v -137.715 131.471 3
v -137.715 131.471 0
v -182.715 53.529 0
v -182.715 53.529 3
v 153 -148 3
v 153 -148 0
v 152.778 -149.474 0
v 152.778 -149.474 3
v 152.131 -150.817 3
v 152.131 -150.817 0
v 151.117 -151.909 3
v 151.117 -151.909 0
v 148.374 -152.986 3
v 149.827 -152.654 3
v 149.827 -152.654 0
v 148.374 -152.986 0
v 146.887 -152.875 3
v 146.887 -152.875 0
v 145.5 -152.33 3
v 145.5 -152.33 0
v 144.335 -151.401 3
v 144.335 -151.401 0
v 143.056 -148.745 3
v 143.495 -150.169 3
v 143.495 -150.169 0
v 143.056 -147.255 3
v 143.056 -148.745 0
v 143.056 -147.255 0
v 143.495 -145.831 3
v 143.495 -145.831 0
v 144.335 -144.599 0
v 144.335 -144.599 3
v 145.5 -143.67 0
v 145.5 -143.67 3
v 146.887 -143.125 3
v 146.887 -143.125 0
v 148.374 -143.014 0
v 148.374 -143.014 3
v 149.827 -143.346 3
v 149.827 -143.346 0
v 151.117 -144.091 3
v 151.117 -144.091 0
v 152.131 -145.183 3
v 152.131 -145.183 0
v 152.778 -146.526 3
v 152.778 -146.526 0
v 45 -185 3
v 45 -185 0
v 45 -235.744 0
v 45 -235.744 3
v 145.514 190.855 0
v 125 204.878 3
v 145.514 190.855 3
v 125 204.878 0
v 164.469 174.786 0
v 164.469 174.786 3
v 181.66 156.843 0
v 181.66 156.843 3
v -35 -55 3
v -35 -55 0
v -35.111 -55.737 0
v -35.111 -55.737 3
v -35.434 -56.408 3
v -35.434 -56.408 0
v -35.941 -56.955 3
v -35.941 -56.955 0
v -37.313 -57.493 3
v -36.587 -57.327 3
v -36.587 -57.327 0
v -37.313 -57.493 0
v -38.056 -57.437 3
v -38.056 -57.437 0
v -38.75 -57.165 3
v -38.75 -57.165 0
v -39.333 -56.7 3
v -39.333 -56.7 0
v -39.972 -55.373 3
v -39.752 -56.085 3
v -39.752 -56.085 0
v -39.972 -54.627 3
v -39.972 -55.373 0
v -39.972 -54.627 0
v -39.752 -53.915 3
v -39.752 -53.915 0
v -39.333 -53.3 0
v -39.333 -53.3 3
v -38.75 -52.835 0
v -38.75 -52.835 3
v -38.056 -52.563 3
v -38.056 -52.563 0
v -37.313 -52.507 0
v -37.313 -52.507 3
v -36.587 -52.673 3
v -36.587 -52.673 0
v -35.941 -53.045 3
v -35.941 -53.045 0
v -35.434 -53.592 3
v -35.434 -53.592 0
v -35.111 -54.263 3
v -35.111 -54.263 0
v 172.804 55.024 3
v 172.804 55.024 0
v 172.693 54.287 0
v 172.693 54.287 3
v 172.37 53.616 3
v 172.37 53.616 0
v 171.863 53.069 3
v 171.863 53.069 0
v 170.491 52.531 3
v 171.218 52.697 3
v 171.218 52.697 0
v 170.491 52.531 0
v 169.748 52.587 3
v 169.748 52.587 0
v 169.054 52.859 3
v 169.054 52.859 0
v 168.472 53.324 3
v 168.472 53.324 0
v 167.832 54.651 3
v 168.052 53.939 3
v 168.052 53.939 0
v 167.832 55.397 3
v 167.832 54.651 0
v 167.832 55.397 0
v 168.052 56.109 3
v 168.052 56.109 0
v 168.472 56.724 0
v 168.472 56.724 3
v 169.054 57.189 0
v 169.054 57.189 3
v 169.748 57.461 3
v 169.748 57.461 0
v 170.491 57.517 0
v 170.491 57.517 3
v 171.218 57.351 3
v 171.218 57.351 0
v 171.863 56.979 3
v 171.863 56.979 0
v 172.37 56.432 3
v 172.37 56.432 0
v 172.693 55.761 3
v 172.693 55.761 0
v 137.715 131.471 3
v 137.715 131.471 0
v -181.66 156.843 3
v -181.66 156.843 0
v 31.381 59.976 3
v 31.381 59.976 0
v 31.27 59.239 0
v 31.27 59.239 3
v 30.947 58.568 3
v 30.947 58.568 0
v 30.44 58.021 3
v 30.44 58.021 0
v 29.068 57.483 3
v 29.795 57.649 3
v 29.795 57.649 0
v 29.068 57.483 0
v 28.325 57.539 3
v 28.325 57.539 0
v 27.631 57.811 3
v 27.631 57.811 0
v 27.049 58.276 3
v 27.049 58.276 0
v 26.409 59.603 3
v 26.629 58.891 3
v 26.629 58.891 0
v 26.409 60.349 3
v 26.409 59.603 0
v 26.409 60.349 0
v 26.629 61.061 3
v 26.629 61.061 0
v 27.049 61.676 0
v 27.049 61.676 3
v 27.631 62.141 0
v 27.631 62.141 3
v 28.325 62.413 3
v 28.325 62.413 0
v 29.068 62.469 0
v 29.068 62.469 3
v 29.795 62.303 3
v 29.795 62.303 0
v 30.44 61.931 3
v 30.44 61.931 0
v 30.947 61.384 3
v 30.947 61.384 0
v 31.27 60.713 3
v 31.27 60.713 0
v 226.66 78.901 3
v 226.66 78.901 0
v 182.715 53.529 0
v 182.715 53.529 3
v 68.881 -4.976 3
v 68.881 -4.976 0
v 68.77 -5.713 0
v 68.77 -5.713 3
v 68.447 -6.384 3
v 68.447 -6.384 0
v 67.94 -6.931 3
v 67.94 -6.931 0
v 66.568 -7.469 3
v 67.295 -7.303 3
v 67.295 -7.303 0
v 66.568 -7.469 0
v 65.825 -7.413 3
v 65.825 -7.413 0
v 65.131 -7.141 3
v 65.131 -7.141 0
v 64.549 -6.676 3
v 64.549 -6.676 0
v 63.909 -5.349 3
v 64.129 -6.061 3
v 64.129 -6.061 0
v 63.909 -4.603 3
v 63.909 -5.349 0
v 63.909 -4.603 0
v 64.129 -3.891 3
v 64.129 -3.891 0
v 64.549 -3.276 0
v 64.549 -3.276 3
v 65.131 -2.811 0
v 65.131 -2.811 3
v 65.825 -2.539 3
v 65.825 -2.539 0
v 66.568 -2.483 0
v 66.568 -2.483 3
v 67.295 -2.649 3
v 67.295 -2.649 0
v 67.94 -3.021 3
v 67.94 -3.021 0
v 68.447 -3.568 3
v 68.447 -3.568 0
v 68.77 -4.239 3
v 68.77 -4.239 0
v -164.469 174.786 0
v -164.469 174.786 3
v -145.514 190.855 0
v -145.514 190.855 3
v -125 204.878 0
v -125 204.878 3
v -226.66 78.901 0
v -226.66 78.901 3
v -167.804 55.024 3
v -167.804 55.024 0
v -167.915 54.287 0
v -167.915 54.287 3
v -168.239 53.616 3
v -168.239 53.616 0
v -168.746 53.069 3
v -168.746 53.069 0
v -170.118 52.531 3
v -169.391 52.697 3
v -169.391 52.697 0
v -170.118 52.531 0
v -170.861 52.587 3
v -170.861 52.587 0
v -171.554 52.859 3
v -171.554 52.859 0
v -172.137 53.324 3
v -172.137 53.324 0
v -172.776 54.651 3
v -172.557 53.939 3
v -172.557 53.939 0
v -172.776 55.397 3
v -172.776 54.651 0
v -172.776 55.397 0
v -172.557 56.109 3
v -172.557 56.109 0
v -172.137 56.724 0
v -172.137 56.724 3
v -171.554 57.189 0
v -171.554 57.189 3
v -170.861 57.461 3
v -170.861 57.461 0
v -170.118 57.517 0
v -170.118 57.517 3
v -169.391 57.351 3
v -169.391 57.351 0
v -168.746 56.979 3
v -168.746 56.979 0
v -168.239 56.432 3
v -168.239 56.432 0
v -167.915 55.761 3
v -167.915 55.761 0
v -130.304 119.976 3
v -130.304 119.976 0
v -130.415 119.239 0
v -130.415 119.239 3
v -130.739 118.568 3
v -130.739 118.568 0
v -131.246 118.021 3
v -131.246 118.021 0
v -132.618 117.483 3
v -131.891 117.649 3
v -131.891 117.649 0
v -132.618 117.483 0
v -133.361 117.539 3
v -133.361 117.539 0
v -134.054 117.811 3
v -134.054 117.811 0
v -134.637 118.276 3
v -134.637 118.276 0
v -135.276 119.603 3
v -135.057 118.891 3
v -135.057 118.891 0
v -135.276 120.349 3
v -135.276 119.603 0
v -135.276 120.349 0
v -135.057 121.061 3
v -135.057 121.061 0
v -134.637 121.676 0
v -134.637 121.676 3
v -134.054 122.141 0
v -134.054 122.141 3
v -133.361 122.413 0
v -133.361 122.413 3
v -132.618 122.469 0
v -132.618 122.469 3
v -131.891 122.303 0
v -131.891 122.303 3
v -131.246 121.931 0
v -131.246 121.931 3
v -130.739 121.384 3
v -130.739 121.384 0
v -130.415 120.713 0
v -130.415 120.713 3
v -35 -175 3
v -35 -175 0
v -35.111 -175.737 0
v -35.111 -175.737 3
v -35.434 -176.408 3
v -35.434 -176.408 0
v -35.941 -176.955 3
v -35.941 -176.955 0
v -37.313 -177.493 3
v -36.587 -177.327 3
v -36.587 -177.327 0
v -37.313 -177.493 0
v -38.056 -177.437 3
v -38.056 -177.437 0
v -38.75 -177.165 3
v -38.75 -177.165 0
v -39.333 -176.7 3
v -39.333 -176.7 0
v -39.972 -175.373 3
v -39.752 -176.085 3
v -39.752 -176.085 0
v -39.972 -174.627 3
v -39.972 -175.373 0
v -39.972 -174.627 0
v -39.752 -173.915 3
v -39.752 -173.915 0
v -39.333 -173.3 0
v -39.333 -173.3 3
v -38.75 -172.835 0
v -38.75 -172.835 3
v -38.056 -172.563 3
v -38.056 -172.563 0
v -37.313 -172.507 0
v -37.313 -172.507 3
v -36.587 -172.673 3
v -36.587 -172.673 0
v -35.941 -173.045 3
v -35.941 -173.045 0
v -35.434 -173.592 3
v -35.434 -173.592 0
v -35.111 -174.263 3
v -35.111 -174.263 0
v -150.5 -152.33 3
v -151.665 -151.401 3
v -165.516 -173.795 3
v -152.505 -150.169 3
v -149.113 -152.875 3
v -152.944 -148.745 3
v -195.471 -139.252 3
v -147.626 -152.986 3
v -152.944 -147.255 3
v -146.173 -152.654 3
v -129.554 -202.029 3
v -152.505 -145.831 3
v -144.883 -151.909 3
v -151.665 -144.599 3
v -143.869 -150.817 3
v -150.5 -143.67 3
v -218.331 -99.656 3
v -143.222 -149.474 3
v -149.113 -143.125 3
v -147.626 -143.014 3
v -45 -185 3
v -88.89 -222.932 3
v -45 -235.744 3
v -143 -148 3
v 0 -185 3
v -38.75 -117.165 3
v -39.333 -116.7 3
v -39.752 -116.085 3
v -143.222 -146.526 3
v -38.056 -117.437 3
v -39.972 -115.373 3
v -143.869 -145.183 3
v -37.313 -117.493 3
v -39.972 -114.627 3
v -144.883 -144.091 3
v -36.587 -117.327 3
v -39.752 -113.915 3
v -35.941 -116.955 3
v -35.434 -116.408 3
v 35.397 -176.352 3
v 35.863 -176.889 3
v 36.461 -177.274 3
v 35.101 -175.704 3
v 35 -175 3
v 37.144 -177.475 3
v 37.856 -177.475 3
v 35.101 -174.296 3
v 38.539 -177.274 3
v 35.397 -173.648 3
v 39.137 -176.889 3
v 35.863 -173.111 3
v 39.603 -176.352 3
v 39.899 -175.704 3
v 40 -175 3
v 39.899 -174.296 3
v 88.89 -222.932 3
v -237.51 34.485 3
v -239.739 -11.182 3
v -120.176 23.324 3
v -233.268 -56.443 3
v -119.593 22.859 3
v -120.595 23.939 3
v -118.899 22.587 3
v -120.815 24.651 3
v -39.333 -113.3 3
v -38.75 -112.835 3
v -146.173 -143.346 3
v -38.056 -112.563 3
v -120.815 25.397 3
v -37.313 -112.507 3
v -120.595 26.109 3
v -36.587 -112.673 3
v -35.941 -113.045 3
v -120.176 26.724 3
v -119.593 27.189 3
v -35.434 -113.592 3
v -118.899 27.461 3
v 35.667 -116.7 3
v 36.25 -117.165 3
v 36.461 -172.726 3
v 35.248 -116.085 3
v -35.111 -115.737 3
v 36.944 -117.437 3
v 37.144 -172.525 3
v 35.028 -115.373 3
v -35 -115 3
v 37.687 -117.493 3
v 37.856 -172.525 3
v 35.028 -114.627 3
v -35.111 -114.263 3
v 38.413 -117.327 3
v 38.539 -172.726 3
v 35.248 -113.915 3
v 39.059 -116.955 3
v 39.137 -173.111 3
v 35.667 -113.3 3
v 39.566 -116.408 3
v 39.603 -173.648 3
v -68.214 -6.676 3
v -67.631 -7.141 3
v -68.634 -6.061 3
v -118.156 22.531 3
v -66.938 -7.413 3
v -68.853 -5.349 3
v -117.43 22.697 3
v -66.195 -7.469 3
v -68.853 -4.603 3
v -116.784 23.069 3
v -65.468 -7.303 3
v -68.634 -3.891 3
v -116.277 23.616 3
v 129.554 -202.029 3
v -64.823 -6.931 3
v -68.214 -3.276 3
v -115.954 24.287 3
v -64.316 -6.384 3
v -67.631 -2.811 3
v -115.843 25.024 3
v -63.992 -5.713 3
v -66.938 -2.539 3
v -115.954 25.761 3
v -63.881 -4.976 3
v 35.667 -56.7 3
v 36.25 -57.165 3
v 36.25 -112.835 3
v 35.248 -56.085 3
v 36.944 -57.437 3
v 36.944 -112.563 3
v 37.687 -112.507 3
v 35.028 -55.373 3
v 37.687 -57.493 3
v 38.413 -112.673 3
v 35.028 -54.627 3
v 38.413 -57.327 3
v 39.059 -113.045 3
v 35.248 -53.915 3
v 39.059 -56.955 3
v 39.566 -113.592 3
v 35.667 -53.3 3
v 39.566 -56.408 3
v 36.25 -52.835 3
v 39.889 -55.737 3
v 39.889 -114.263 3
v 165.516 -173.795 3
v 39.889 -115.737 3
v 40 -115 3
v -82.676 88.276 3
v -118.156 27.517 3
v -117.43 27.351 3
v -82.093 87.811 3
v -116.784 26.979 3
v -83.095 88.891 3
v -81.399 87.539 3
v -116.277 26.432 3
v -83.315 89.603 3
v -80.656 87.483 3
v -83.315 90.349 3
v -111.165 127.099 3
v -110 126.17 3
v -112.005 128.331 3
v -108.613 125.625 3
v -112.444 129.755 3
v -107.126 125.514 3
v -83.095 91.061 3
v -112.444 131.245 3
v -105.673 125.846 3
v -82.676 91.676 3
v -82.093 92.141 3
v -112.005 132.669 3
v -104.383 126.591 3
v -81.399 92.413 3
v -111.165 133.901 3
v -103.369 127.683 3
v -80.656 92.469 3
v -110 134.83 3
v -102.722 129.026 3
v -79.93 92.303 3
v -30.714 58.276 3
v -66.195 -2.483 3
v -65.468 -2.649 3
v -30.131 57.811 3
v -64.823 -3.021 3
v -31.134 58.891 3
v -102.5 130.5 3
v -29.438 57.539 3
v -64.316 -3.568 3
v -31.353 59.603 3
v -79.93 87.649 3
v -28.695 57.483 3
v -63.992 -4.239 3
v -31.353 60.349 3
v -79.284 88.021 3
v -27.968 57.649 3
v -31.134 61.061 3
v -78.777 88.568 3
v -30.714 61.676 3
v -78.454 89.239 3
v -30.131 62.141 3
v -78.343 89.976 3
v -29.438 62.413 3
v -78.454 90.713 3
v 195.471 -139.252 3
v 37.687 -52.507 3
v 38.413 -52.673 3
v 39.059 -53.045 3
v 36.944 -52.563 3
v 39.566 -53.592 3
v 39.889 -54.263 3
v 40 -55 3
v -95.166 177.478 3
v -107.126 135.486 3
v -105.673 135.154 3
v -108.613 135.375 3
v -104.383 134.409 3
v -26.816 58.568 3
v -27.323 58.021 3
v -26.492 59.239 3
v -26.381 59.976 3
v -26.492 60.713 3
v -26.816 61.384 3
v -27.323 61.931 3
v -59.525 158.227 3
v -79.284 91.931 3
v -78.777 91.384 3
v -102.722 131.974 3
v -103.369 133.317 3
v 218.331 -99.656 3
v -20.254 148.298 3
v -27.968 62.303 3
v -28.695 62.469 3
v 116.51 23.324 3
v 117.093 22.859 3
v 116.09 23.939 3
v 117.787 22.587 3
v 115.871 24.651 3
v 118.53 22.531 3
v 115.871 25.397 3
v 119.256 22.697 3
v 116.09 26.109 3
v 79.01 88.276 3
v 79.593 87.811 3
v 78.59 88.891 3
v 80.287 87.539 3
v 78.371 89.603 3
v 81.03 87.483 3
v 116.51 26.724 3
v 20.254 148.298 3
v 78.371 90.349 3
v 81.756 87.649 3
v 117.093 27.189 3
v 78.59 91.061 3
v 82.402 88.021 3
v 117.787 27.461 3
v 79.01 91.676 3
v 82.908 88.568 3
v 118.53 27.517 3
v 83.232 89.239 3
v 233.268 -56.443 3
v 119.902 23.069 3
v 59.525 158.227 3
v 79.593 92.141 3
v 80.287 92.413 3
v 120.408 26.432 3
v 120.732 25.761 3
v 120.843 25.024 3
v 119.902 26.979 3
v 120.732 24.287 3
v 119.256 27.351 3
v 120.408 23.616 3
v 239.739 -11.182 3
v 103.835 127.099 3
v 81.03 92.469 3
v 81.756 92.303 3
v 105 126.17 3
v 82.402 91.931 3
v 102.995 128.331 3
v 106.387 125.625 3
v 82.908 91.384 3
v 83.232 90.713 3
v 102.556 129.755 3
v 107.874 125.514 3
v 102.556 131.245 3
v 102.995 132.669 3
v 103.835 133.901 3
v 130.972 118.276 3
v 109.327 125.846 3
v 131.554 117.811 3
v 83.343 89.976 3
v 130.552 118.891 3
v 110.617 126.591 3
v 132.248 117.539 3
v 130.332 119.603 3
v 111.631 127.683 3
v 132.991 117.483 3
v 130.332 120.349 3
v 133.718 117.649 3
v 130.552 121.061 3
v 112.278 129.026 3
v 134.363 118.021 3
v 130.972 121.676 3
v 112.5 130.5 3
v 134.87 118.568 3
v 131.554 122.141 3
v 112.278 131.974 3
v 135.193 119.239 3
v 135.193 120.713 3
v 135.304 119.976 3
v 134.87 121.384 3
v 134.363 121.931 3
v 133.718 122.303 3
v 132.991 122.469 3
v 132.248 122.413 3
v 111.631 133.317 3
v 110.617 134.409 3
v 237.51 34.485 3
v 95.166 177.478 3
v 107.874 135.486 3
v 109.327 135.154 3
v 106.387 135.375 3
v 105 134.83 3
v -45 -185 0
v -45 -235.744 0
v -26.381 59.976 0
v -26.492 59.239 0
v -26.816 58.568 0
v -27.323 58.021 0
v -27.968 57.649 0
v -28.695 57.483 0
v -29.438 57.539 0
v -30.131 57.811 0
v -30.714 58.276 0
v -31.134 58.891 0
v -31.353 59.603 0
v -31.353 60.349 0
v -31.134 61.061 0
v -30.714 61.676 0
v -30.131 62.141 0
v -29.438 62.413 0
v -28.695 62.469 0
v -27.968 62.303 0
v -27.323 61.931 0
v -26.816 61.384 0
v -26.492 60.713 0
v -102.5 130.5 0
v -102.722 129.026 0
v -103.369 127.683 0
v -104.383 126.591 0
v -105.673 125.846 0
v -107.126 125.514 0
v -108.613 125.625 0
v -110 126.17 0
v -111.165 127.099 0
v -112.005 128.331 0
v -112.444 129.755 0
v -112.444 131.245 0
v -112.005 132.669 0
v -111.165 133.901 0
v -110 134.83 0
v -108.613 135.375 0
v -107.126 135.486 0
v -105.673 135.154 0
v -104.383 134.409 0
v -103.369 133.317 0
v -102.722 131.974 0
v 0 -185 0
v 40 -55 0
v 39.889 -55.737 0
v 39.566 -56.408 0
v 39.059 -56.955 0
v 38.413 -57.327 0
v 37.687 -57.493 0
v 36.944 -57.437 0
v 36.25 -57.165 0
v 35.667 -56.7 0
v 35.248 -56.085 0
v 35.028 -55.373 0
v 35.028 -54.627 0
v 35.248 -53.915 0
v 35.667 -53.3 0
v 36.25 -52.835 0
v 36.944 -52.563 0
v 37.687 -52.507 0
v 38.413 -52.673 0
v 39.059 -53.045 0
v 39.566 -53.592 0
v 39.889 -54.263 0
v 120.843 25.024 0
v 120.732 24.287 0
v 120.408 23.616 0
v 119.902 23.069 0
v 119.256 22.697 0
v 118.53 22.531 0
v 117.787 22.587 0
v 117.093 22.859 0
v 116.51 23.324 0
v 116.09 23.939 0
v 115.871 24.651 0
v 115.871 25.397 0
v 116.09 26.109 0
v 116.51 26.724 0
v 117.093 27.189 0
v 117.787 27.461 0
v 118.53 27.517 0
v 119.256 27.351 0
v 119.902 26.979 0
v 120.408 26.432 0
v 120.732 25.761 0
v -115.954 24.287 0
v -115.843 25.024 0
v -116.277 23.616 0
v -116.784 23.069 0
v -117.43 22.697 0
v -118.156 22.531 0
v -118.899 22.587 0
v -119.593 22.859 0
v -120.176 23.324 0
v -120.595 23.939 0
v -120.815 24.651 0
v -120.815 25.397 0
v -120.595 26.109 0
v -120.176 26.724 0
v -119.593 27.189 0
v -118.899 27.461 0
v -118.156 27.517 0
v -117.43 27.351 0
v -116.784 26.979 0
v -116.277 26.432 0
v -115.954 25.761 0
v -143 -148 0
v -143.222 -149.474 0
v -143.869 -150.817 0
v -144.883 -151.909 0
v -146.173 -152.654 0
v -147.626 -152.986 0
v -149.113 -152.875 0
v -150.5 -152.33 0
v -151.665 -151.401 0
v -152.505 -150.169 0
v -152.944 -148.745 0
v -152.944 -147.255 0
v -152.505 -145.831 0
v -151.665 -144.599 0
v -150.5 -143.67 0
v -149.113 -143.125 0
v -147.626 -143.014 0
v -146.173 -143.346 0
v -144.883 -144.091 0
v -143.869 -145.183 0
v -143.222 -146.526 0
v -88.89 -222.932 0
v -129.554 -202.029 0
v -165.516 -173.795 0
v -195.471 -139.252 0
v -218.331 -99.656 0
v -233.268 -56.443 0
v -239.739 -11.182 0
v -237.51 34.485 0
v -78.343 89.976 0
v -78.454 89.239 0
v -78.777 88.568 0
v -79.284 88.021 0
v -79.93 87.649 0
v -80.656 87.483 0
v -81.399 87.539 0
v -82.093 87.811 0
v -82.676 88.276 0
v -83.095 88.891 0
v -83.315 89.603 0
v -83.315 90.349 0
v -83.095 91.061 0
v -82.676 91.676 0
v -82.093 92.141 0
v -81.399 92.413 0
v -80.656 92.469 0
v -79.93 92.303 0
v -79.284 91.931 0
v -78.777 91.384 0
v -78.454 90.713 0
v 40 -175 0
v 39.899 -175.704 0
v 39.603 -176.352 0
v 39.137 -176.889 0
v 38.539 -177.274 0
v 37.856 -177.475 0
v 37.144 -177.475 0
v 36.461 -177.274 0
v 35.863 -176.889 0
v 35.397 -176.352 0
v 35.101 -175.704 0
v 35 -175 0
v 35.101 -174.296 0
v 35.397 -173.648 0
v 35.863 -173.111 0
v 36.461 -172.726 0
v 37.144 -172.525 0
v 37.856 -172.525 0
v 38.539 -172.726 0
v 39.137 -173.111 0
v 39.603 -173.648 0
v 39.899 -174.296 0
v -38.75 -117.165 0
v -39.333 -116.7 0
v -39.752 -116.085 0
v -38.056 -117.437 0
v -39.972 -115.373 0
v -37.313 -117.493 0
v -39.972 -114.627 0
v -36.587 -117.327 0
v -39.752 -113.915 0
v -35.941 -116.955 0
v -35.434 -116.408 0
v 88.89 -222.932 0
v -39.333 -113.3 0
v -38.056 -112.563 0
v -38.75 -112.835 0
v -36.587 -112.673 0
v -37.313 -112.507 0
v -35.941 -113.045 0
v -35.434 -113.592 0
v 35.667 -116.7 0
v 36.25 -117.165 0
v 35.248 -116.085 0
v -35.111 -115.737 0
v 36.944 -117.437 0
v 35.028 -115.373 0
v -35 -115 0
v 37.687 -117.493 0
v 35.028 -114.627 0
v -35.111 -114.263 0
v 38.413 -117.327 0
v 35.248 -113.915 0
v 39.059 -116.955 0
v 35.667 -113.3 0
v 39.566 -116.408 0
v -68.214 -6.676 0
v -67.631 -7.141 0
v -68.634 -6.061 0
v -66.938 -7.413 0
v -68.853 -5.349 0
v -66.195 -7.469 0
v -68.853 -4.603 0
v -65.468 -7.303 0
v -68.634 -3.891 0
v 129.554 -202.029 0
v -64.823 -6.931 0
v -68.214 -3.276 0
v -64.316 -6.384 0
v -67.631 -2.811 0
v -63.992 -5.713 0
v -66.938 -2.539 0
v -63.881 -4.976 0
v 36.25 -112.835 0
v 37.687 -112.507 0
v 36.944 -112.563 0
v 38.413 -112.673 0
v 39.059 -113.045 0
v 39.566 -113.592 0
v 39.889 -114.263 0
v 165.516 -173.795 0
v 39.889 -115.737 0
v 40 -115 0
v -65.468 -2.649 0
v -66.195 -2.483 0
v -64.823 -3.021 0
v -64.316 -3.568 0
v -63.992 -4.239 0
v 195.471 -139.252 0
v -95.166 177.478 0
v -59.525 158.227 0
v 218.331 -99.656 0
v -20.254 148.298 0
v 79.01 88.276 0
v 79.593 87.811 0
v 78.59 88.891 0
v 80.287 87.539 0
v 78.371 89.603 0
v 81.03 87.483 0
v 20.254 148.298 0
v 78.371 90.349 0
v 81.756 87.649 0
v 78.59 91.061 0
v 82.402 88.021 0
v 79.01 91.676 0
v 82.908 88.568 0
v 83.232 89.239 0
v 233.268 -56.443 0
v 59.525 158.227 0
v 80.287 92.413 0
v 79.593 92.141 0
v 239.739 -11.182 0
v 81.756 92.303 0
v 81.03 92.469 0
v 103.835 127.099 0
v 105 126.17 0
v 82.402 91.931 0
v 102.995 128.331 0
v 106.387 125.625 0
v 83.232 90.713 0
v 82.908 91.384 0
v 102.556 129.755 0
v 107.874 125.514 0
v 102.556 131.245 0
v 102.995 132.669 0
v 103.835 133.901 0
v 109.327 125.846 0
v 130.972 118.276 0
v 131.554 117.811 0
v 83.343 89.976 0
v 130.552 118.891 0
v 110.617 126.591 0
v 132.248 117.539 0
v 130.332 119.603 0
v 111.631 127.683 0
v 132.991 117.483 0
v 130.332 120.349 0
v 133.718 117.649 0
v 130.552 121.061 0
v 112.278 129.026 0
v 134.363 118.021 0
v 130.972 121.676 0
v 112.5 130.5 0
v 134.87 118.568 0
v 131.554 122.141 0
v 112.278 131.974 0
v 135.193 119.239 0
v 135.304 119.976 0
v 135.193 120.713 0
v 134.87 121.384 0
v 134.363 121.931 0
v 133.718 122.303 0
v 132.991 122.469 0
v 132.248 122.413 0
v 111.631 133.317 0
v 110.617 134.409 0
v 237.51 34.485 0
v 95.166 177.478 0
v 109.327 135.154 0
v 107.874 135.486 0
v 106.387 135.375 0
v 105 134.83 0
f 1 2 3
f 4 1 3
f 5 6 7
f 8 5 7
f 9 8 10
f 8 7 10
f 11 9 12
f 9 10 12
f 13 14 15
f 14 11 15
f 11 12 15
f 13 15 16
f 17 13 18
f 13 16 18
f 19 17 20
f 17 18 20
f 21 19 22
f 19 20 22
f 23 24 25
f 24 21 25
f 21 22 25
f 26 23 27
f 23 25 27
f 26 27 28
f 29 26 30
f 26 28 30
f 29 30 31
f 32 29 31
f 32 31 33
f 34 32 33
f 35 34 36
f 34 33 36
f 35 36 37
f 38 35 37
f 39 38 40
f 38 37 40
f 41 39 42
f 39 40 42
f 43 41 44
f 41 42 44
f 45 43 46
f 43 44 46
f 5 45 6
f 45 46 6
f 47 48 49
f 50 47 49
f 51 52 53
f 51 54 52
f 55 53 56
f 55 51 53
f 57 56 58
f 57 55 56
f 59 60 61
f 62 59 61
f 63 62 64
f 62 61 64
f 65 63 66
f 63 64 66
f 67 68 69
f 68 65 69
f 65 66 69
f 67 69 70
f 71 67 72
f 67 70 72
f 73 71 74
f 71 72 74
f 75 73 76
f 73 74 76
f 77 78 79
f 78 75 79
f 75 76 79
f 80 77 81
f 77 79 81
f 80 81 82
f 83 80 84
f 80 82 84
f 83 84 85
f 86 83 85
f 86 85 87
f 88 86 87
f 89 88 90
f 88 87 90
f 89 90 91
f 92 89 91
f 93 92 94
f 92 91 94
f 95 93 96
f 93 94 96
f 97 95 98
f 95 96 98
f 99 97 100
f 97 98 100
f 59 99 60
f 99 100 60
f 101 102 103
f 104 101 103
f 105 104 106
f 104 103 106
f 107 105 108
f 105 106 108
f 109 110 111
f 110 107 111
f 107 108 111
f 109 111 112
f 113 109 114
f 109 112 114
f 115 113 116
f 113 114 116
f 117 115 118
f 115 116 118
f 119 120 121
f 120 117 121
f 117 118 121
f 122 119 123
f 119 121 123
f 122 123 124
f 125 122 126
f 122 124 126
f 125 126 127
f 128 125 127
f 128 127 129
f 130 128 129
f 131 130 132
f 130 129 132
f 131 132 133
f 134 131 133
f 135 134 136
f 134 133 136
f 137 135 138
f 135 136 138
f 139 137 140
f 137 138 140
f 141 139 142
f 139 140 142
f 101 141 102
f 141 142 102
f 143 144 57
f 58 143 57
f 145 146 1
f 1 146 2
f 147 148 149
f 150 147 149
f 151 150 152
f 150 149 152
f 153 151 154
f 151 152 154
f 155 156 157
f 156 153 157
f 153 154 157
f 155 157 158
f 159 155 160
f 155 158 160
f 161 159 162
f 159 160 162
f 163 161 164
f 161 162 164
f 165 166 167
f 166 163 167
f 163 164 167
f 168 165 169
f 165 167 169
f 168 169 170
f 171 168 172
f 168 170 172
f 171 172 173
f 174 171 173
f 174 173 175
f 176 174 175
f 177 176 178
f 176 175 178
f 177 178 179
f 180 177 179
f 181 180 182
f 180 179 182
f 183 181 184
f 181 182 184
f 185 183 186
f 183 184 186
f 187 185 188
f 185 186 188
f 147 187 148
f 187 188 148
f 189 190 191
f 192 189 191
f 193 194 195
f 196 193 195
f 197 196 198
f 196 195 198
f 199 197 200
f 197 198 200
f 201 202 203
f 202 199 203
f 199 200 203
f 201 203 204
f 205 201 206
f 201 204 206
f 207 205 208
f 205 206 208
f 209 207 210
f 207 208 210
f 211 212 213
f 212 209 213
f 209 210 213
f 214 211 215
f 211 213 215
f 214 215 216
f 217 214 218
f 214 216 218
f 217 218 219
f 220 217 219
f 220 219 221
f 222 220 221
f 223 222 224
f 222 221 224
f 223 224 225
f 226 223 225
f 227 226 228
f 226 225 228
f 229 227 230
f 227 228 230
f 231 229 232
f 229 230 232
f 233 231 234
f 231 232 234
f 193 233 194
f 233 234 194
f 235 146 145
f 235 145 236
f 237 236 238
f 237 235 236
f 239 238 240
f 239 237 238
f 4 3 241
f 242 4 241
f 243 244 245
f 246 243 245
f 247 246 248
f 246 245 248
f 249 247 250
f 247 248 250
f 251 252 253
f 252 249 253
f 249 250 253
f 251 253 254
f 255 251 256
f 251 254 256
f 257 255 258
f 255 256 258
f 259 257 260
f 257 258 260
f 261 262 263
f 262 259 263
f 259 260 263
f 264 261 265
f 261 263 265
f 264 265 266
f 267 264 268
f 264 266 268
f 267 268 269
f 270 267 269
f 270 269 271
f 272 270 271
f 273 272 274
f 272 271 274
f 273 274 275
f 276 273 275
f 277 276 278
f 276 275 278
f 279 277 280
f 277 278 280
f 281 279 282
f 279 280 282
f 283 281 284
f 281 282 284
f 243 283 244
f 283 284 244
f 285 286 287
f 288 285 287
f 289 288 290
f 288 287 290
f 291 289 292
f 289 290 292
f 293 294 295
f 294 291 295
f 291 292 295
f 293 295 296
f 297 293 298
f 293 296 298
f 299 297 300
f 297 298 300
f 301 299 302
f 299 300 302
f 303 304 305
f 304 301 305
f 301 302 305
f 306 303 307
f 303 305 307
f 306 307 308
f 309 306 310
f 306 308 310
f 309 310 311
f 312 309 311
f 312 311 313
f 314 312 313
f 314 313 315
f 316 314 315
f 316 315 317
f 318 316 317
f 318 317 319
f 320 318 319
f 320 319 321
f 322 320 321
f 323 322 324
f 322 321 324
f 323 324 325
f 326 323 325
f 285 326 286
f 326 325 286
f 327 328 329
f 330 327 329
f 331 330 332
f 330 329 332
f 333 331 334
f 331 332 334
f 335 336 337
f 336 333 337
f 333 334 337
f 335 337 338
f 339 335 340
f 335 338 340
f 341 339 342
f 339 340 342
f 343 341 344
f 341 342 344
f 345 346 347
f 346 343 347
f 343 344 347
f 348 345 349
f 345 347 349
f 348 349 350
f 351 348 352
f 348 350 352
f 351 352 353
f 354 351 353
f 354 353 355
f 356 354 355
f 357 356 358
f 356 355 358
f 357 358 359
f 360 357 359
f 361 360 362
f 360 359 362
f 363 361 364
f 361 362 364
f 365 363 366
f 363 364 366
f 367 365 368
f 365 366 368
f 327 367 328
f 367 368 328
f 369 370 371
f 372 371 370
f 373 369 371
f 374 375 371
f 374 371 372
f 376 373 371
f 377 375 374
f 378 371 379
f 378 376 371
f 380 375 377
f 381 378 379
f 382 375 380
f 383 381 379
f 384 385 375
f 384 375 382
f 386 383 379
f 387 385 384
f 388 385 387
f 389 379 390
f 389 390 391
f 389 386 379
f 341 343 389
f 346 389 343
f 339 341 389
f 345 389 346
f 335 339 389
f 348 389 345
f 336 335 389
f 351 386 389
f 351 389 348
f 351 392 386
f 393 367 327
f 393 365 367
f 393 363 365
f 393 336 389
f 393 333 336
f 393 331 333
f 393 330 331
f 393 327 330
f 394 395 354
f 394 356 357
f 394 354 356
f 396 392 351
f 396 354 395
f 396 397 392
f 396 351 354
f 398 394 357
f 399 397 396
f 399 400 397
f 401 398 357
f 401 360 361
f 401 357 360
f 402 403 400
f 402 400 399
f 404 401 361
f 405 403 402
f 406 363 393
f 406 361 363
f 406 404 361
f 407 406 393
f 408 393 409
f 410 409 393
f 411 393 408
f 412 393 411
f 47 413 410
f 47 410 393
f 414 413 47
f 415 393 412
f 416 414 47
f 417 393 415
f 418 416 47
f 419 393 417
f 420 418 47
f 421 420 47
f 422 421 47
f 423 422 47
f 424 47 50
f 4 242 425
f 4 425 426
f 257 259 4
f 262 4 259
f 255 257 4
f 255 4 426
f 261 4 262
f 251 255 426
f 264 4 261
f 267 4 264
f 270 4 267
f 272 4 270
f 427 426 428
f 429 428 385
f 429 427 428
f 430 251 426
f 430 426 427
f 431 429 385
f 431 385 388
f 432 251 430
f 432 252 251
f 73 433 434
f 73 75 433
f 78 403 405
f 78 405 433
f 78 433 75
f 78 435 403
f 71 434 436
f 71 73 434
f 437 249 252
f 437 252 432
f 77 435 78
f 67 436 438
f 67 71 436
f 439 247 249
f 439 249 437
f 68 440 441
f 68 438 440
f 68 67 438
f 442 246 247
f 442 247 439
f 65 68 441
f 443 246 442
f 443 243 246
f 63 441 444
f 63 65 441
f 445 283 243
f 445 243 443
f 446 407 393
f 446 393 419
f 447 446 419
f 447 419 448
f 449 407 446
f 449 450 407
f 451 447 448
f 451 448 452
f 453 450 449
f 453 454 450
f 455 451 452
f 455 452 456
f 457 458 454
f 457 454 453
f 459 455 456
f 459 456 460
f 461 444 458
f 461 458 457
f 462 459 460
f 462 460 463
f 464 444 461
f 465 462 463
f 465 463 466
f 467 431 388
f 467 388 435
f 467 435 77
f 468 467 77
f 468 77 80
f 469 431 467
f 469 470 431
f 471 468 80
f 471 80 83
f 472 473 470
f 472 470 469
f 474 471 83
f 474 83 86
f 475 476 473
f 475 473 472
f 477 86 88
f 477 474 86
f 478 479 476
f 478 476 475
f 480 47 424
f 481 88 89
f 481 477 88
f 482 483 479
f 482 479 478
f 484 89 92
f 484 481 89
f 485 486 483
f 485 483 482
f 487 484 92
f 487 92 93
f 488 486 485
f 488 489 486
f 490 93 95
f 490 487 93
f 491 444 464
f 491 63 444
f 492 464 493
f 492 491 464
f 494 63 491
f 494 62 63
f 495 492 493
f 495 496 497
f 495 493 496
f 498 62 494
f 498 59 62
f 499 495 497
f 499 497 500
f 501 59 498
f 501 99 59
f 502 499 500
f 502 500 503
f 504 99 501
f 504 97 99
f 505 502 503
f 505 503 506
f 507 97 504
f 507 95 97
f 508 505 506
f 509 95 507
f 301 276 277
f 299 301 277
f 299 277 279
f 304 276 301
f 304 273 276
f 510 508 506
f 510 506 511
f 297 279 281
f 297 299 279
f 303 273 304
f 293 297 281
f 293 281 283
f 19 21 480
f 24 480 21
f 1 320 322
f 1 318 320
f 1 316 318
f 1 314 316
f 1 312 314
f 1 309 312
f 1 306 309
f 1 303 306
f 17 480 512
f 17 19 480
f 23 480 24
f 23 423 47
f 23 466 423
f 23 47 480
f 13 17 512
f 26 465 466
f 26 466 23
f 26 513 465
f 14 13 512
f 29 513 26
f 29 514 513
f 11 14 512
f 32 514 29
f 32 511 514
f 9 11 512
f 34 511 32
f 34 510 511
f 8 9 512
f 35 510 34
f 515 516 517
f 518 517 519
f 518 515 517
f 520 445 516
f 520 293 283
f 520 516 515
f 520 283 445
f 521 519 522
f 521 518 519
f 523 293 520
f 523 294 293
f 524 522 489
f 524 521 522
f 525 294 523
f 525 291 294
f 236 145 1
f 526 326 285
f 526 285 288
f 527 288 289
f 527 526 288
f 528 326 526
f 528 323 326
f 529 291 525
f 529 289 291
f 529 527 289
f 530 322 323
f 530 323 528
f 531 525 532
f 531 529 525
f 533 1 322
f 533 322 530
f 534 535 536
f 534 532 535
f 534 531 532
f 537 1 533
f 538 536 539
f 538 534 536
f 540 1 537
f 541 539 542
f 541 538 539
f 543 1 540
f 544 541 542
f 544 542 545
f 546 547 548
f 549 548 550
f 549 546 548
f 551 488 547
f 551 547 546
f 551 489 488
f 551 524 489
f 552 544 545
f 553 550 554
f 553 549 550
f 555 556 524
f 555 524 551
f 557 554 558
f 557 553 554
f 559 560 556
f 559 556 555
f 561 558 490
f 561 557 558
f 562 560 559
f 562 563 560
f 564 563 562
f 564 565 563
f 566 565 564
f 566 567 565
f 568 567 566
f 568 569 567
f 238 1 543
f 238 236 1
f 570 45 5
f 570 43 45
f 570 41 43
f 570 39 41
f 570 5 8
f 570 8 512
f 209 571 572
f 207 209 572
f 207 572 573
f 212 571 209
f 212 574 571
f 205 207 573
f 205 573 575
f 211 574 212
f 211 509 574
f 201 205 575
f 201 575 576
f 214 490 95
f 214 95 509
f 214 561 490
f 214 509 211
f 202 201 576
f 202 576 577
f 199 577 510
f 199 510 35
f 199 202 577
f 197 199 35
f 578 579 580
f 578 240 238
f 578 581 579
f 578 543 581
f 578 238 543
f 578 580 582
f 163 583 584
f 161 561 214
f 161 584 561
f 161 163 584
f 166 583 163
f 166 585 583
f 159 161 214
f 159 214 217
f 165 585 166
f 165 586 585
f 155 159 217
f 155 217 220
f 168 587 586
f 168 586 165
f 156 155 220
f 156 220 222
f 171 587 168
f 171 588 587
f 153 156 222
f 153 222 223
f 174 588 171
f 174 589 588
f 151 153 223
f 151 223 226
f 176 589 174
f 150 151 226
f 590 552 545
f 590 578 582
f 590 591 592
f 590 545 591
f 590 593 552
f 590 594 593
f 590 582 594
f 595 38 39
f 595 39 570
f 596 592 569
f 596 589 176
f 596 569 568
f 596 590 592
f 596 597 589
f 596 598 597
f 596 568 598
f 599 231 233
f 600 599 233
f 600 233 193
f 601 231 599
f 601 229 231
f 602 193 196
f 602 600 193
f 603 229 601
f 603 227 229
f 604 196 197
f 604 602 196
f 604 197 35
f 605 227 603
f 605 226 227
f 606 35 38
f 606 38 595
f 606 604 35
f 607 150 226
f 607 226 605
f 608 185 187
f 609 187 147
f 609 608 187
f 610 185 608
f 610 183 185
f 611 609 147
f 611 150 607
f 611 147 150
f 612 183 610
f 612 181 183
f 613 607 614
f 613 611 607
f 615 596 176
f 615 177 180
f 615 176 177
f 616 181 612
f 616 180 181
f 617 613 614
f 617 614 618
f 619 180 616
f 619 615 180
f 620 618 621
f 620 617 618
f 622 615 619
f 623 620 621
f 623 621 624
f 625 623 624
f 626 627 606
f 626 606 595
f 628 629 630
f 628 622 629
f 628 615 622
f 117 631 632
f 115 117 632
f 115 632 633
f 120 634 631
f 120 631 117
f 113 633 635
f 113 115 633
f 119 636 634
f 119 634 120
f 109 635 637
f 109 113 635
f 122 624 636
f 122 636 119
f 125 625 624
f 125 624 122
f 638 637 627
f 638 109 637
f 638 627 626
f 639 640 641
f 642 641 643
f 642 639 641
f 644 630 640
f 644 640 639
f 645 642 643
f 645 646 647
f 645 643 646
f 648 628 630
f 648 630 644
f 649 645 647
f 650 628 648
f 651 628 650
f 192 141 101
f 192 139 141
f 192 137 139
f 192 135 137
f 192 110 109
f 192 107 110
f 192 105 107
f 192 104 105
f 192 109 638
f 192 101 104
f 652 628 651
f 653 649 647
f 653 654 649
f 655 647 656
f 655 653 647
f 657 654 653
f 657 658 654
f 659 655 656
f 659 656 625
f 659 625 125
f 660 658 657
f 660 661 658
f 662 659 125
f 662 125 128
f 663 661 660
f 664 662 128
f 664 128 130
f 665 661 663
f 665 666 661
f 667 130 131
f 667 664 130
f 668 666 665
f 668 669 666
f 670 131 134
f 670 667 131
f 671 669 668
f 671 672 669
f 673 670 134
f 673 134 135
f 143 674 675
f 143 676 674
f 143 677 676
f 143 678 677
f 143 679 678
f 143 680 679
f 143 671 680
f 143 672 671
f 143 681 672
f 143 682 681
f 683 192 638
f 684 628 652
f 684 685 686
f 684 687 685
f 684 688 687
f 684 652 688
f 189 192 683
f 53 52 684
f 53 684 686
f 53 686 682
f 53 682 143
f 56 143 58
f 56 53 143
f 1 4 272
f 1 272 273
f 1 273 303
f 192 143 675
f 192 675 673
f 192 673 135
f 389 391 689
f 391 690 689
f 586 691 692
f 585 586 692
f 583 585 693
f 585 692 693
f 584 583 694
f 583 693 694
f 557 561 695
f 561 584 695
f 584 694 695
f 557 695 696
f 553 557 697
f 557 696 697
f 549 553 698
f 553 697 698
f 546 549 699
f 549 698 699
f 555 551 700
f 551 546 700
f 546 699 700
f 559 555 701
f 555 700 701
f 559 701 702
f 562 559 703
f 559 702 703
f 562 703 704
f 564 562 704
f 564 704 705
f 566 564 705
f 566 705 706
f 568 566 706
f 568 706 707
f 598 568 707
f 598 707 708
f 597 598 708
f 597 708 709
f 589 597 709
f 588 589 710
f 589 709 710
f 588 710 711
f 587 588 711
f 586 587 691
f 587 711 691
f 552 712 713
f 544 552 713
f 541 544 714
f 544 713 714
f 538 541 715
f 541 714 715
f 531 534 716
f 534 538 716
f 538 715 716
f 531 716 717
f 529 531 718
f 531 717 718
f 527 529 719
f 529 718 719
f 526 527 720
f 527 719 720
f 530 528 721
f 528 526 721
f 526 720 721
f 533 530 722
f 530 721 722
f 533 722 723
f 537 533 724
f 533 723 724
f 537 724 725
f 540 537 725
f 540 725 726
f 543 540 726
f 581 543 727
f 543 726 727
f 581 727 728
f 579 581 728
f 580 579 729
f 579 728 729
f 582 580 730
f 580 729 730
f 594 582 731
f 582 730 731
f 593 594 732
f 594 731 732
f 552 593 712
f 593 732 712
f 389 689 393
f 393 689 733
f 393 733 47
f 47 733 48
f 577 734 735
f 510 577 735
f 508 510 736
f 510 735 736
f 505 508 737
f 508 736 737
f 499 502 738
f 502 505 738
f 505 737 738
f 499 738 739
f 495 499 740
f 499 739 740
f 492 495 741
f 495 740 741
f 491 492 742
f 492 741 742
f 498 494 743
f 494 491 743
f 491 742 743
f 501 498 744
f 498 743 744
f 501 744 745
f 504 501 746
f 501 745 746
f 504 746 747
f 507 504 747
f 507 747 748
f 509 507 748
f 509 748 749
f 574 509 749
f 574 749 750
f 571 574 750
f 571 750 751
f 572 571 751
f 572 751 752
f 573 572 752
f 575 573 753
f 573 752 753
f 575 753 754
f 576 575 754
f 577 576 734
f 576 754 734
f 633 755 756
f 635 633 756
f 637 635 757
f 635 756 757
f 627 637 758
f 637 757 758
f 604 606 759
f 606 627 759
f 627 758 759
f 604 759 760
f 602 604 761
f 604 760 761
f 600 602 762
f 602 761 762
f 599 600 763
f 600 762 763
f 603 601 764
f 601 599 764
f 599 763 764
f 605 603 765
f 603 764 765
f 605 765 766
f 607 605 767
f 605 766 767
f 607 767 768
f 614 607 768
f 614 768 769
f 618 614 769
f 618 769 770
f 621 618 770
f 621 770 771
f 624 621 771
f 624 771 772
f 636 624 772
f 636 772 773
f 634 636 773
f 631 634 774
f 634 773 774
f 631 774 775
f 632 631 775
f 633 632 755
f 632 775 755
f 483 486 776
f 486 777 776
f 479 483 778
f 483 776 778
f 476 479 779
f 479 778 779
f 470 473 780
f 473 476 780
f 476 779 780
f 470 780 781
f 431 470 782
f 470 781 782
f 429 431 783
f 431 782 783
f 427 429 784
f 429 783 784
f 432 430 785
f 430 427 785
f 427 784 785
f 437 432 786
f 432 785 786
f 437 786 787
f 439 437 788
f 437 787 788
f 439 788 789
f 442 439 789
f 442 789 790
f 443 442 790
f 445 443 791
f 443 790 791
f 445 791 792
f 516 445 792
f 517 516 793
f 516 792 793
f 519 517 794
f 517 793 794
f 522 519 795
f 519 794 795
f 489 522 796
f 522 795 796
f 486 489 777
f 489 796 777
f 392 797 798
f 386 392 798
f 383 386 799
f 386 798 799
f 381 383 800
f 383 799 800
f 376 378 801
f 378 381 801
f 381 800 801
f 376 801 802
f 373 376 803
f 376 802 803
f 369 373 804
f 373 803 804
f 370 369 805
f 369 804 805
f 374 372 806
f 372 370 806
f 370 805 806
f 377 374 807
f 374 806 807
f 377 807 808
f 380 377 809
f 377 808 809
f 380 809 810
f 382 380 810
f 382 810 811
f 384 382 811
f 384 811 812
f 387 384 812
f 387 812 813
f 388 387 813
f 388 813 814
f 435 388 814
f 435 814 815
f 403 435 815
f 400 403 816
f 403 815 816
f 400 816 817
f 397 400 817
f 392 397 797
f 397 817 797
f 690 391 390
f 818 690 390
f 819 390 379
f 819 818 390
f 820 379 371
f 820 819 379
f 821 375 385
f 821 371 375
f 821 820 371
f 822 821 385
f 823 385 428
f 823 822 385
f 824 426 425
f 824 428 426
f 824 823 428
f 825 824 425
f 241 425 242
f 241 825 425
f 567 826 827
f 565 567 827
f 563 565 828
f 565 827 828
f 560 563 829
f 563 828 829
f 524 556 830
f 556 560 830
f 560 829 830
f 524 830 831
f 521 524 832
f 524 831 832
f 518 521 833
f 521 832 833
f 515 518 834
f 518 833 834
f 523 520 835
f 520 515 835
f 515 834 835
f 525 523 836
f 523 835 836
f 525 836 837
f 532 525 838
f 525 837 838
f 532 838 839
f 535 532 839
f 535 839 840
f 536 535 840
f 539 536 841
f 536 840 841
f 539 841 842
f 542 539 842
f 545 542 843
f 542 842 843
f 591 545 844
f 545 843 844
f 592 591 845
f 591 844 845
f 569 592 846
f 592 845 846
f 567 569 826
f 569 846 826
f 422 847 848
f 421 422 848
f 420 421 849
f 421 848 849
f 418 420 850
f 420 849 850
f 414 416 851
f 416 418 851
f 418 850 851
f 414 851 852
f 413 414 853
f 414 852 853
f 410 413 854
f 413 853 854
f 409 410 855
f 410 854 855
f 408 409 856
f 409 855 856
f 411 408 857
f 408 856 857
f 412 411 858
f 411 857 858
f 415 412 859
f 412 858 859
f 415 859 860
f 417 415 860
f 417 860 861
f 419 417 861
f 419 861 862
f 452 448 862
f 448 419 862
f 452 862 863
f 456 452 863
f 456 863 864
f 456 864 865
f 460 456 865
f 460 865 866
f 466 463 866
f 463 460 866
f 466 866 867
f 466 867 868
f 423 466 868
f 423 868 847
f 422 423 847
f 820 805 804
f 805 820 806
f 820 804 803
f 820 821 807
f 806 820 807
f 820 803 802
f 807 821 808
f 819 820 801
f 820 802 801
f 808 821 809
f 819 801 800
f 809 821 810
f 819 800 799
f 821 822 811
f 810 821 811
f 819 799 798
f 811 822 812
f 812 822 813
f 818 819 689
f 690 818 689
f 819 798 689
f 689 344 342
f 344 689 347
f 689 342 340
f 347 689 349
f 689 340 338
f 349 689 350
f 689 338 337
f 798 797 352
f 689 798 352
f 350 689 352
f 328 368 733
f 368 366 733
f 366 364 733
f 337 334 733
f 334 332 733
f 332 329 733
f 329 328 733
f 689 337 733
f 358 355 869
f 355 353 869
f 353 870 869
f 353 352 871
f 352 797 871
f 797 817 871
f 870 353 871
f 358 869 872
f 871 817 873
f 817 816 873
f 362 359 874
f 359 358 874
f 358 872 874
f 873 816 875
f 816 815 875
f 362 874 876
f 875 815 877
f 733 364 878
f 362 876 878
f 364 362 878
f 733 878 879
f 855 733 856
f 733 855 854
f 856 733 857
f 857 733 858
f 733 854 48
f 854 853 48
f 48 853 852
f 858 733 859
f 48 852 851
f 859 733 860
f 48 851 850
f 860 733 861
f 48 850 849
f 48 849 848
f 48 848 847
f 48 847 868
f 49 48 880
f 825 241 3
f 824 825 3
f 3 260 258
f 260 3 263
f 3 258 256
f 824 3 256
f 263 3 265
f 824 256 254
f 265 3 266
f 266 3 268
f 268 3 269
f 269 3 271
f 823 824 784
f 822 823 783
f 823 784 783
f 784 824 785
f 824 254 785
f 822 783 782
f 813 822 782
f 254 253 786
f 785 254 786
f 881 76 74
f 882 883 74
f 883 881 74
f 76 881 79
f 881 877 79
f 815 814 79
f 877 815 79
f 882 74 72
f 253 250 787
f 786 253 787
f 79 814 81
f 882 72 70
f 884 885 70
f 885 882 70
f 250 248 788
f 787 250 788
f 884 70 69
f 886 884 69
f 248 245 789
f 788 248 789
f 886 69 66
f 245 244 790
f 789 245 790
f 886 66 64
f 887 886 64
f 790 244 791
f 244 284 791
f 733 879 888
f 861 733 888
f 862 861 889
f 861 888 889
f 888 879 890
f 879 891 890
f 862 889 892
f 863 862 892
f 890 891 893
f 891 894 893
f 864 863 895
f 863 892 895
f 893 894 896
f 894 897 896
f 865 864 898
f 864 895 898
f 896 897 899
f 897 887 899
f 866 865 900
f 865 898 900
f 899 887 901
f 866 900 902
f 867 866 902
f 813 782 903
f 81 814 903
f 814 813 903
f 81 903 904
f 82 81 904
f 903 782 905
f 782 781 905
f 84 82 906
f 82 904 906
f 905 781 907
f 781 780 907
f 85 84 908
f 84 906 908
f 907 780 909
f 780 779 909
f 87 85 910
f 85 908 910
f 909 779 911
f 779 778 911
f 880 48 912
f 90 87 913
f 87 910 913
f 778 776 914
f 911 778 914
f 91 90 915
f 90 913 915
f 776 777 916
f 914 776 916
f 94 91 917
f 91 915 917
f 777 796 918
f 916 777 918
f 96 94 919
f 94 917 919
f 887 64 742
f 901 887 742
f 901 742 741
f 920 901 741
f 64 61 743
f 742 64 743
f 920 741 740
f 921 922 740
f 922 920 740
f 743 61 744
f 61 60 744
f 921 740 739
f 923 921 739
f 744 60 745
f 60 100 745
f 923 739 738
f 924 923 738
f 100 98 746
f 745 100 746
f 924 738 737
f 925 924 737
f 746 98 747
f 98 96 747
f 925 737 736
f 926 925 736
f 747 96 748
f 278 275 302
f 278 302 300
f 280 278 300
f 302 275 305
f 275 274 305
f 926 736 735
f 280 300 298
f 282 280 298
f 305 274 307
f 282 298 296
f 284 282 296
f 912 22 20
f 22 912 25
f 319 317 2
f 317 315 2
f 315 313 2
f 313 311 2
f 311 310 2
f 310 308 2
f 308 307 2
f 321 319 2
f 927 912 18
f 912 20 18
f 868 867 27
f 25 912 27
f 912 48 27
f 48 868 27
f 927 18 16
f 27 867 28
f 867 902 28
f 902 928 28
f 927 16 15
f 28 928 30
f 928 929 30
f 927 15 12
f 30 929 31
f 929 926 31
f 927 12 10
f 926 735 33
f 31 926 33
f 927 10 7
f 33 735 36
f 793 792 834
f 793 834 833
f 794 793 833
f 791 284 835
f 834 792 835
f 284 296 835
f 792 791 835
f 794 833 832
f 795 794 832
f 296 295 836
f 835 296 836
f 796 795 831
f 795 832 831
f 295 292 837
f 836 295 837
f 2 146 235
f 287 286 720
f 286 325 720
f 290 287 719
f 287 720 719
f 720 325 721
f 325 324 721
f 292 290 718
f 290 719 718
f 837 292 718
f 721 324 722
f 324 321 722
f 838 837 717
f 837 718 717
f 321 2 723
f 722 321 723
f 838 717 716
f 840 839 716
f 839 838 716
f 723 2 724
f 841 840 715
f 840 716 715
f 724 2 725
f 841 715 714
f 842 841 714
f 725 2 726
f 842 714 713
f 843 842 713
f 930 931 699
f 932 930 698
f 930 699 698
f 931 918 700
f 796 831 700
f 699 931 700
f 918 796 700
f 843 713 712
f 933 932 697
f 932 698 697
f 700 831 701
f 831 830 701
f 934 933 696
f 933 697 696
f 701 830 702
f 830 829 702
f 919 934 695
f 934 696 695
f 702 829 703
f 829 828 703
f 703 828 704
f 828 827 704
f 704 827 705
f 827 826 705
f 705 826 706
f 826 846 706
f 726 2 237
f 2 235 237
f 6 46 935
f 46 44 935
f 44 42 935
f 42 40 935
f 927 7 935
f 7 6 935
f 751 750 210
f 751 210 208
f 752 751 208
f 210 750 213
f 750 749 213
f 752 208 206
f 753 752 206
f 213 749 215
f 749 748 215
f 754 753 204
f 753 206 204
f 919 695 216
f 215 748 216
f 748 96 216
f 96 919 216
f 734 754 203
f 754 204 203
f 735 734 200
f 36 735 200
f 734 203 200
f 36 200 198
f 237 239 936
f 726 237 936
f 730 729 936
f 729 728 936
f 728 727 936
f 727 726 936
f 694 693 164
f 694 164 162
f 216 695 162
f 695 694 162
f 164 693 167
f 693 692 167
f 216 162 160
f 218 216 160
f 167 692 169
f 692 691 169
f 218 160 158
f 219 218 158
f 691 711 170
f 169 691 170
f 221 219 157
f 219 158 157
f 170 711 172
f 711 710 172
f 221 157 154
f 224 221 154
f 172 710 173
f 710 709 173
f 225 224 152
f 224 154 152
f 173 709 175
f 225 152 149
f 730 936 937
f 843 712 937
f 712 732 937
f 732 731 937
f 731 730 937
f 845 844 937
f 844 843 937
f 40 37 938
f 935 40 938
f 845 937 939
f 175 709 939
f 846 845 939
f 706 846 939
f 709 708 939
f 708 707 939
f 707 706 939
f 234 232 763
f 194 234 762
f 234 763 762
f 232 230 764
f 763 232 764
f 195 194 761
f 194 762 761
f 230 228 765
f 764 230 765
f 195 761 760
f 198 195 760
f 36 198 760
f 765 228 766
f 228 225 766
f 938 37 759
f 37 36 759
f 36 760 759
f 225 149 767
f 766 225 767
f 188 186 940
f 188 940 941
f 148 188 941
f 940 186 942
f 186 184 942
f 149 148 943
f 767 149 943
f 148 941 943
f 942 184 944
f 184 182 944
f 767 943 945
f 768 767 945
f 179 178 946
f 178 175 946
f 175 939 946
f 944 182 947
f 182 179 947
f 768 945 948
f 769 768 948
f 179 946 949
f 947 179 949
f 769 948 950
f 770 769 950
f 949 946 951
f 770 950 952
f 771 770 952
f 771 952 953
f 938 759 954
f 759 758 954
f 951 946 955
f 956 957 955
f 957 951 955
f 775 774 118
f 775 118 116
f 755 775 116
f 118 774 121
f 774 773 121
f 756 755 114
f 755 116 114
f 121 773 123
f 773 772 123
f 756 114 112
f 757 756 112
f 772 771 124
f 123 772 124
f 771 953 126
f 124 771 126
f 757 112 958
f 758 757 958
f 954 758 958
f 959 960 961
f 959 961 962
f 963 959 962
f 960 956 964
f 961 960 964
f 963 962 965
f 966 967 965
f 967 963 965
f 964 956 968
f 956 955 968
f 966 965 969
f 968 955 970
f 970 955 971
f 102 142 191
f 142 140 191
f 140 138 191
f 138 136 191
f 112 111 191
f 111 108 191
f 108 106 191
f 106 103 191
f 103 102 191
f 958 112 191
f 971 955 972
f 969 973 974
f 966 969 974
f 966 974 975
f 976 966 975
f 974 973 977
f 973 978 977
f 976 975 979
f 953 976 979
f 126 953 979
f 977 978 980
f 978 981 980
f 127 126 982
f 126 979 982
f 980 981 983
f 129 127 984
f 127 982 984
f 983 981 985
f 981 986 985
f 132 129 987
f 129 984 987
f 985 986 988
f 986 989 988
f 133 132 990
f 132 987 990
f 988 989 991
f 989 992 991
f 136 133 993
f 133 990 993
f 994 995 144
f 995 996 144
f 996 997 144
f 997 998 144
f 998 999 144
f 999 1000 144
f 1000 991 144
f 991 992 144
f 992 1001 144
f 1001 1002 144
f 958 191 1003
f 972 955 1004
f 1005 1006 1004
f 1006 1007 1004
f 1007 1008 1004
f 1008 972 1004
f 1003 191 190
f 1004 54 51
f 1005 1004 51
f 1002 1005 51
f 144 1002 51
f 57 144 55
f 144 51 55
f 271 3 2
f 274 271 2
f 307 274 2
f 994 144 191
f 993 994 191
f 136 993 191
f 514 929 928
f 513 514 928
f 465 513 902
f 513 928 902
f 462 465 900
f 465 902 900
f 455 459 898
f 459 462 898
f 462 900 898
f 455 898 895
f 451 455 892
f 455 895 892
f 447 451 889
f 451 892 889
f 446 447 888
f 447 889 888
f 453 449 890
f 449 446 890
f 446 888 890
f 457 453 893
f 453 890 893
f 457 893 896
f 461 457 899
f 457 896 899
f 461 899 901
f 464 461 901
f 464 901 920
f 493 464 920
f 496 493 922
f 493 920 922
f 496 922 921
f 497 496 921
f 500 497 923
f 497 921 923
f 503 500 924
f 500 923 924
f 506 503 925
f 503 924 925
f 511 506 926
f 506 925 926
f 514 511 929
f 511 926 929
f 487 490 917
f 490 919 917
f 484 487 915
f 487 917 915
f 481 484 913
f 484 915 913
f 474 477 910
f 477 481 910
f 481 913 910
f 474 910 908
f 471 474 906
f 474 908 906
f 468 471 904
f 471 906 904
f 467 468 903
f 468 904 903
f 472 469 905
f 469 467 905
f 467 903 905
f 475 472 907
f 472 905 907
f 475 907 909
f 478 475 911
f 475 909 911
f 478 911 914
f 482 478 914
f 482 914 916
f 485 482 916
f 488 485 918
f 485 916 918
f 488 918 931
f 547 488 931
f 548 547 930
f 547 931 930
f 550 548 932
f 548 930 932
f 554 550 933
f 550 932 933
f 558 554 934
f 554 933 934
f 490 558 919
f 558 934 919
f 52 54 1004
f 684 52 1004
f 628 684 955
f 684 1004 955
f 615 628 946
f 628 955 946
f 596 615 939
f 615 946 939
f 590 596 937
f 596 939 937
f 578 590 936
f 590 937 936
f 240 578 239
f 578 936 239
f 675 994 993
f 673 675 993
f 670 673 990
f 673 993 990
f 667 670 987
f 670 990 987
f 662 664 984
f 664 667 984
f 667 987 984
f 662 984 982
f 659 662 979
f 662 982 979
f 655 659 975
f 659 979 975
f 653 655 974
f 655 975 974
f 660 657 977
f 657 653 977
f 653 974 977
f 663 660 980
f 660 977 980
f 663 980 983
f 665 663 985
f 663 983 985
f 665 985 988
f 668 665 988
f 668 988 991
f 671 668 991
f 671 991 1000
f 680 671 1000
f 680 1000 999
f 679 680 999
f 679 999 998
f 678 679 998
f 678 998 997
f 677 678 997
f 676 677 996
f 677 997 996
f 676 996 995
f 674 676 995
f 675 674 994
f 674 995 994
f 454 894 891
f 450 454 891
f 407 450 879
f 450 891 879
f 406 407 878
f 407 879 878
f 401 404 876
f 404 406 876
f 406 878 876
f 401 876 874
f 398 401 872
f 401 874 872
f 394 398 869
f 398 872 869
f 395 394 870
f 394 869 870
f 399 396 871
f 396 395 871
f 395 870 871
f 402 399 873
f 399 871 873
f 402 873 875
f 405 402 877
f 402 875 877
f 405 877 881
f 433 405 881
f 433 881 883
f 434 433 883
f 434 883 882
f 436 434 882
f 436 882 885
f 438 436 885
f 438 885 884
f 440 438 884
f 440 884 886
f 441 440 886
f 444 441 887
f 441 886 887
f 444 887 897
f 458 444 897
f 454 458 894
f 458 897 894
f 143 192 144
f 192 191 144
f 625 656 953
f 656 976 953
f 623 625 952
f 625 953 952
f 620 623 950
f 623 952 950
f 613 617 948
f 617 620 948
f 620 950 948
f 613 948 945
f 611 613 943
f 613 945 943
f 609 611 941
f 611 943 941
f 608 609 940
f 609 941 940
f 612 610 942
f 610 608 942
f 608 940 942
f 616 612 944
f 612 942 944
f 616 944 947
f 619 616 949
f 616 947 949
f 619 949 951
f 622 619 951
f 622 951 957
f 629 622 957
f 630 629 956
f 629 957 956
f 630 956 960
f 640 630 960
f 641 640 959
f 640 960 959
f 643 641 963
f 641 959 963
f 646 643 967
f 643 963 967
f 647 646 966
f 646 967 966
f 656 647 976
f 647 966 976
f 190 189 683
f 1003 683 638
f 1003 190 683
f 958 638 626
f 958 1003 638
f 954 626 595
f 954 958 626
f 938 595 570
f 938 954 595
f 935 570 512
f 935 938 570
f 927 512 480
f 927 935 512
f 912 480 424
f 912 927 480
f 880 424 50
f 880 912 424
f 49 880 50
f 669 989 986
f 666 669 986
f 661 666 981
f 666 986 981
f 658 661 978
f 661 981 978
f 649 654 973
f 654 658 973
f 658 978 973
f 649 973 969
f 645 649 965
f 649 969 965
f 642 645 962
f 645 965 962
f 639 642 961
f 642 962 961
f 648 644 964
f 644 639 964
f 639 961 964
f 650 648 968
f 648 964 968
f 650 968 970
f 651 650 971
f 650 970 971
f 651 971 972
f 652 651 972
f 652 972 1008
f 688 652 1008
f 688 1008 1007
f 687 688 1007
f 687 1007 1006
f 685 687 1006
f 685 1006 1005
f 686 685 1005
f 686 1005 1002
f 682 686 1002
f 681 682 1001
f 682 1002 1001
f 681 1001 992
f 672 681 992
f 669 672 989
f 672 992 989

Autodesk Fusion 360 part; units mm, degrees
sketch "Esboço1" plane through (0, 0, 0) normal (0, 0, 1) x (1, 0, 0)
  circle A0 centre (0, 0) radius 240
  circle A1 centre (148, -148) radius 5
  line L0 (-125, 204.878) -> (125, 204.878)
  circle A2 centre (0, 311.043) radius 164
  circle A3 centre (107.5, 130.5) radius 5
  line L1 (-40, 115) -> (40, 115)
  line L2 (-40, 115) -> (-40, 151.9958)
  line L3 (40, 115) -> (40, 151.9958)
  line L4 (0, 1.75) -> (0, 22.5)
  circle A4 centre (-148, -148) radius 5
  circle A5 centre (-107.5, 130.5) radius 5
  line L5 (-45, -185) -> (45, -185)
  line L6 (45, -185) -> (45, -240)
  line L7 (45, -240) -> (-45, -240)
  line L8 (-45, -240) -> (-45, -185)
  line L9 (0, -185) -> (0, -175)
  line L10 (-37.5, -175) -> (37.5, -175)
  circle A6 centre (-37.5, -175) radius 2.5
  circle A7 centre (37.5, -175) radius 2.5
  circle A8 centre (37.5, -115) radius 2.5
  circle A9 centre (37.5, -55) radius 2.5
  circle A10 centre (-37.5, -115) radius 2.5
  circle A11 centre (-37.5, -55) radius 2.5
  circle A12 centre (132.8044, 119.976) radius 2.5
  line L11 (230.3461, 81.0289) -> (182.7147, 53.5289)
  line L12 (182.7147, 53.5289) -> (137.7147, 131.4711)
  line L13 (137.7147, 131.4711) -> (185.3461, 158.9711)
  circle A13 centre (80.8429, 89.976) radius 2.5
  circle A14 centre (170.3044, 55.024) radius 2.5
  circle A15 centre (118.3429, 25.024) radius 2.5
  circle A16 centre (66.3814, -4.976) radius 2.5
  circle A17 centre (28.8814, 59.976) radius 2.5
  circle A18 centre (-170.3044, 55.024) radius 2.5
  line L14 (-185.3461, 158.9711) -> (-137.7147, 131.4711)
  line L15 (-137.7147, 131.4711) -> (-182.7147, 53.5289)
  line L16 (-182.7147, 53.5289) -> (-230.3461, 81.0289)
  circle A19 centre (-118.3429, 25.024) radius 2.5
  circle A20 centre (-132.8044, 119.976) radius 2.5
  circle A21 centre (-80.8429, 89.976) radius 2.5
  circle A22 centre (-28.8814, 59.976) radius 2.5
  circle A23 centre (-66.3814, -4.976) radius 2.5
  point P0 (0, 115)
  point P1 (0, -240)
  point P2 (-45, -235.7435)
  dimension "d1" = 480
  dimension "d13" = 10
  dimension "d14" = 148
  dimension "d15" = 148
  dimension "d16" = 250
  dimension "d17" = 328
  dimension "d18" = 10
  dimension "d19" = 130.5
  dimension "d20" = 107.5
  dimension "d21" = 115
  dimension "d22" = 80
  dimension "d25" = 90
  dimension "d26" = 55
  dimension "d27" = 10
  dimension "d28" = 75
  dimension "d29" = 5
  dimension "d30" = 5
  dimension "d33" = 1
  dimension "d34" = 60
  dimension "d36" = 360
extrude "Extrusão1" add sketch "Esboço1" along normal blind 3 contours A0 A2 L1 L2 L3 L5 L6 L8 L11 L12 L13 L14 L15 L16 | A2 L1 L2 L3
equation "d17 = ( 164 * 2 ) * 1 mm"
